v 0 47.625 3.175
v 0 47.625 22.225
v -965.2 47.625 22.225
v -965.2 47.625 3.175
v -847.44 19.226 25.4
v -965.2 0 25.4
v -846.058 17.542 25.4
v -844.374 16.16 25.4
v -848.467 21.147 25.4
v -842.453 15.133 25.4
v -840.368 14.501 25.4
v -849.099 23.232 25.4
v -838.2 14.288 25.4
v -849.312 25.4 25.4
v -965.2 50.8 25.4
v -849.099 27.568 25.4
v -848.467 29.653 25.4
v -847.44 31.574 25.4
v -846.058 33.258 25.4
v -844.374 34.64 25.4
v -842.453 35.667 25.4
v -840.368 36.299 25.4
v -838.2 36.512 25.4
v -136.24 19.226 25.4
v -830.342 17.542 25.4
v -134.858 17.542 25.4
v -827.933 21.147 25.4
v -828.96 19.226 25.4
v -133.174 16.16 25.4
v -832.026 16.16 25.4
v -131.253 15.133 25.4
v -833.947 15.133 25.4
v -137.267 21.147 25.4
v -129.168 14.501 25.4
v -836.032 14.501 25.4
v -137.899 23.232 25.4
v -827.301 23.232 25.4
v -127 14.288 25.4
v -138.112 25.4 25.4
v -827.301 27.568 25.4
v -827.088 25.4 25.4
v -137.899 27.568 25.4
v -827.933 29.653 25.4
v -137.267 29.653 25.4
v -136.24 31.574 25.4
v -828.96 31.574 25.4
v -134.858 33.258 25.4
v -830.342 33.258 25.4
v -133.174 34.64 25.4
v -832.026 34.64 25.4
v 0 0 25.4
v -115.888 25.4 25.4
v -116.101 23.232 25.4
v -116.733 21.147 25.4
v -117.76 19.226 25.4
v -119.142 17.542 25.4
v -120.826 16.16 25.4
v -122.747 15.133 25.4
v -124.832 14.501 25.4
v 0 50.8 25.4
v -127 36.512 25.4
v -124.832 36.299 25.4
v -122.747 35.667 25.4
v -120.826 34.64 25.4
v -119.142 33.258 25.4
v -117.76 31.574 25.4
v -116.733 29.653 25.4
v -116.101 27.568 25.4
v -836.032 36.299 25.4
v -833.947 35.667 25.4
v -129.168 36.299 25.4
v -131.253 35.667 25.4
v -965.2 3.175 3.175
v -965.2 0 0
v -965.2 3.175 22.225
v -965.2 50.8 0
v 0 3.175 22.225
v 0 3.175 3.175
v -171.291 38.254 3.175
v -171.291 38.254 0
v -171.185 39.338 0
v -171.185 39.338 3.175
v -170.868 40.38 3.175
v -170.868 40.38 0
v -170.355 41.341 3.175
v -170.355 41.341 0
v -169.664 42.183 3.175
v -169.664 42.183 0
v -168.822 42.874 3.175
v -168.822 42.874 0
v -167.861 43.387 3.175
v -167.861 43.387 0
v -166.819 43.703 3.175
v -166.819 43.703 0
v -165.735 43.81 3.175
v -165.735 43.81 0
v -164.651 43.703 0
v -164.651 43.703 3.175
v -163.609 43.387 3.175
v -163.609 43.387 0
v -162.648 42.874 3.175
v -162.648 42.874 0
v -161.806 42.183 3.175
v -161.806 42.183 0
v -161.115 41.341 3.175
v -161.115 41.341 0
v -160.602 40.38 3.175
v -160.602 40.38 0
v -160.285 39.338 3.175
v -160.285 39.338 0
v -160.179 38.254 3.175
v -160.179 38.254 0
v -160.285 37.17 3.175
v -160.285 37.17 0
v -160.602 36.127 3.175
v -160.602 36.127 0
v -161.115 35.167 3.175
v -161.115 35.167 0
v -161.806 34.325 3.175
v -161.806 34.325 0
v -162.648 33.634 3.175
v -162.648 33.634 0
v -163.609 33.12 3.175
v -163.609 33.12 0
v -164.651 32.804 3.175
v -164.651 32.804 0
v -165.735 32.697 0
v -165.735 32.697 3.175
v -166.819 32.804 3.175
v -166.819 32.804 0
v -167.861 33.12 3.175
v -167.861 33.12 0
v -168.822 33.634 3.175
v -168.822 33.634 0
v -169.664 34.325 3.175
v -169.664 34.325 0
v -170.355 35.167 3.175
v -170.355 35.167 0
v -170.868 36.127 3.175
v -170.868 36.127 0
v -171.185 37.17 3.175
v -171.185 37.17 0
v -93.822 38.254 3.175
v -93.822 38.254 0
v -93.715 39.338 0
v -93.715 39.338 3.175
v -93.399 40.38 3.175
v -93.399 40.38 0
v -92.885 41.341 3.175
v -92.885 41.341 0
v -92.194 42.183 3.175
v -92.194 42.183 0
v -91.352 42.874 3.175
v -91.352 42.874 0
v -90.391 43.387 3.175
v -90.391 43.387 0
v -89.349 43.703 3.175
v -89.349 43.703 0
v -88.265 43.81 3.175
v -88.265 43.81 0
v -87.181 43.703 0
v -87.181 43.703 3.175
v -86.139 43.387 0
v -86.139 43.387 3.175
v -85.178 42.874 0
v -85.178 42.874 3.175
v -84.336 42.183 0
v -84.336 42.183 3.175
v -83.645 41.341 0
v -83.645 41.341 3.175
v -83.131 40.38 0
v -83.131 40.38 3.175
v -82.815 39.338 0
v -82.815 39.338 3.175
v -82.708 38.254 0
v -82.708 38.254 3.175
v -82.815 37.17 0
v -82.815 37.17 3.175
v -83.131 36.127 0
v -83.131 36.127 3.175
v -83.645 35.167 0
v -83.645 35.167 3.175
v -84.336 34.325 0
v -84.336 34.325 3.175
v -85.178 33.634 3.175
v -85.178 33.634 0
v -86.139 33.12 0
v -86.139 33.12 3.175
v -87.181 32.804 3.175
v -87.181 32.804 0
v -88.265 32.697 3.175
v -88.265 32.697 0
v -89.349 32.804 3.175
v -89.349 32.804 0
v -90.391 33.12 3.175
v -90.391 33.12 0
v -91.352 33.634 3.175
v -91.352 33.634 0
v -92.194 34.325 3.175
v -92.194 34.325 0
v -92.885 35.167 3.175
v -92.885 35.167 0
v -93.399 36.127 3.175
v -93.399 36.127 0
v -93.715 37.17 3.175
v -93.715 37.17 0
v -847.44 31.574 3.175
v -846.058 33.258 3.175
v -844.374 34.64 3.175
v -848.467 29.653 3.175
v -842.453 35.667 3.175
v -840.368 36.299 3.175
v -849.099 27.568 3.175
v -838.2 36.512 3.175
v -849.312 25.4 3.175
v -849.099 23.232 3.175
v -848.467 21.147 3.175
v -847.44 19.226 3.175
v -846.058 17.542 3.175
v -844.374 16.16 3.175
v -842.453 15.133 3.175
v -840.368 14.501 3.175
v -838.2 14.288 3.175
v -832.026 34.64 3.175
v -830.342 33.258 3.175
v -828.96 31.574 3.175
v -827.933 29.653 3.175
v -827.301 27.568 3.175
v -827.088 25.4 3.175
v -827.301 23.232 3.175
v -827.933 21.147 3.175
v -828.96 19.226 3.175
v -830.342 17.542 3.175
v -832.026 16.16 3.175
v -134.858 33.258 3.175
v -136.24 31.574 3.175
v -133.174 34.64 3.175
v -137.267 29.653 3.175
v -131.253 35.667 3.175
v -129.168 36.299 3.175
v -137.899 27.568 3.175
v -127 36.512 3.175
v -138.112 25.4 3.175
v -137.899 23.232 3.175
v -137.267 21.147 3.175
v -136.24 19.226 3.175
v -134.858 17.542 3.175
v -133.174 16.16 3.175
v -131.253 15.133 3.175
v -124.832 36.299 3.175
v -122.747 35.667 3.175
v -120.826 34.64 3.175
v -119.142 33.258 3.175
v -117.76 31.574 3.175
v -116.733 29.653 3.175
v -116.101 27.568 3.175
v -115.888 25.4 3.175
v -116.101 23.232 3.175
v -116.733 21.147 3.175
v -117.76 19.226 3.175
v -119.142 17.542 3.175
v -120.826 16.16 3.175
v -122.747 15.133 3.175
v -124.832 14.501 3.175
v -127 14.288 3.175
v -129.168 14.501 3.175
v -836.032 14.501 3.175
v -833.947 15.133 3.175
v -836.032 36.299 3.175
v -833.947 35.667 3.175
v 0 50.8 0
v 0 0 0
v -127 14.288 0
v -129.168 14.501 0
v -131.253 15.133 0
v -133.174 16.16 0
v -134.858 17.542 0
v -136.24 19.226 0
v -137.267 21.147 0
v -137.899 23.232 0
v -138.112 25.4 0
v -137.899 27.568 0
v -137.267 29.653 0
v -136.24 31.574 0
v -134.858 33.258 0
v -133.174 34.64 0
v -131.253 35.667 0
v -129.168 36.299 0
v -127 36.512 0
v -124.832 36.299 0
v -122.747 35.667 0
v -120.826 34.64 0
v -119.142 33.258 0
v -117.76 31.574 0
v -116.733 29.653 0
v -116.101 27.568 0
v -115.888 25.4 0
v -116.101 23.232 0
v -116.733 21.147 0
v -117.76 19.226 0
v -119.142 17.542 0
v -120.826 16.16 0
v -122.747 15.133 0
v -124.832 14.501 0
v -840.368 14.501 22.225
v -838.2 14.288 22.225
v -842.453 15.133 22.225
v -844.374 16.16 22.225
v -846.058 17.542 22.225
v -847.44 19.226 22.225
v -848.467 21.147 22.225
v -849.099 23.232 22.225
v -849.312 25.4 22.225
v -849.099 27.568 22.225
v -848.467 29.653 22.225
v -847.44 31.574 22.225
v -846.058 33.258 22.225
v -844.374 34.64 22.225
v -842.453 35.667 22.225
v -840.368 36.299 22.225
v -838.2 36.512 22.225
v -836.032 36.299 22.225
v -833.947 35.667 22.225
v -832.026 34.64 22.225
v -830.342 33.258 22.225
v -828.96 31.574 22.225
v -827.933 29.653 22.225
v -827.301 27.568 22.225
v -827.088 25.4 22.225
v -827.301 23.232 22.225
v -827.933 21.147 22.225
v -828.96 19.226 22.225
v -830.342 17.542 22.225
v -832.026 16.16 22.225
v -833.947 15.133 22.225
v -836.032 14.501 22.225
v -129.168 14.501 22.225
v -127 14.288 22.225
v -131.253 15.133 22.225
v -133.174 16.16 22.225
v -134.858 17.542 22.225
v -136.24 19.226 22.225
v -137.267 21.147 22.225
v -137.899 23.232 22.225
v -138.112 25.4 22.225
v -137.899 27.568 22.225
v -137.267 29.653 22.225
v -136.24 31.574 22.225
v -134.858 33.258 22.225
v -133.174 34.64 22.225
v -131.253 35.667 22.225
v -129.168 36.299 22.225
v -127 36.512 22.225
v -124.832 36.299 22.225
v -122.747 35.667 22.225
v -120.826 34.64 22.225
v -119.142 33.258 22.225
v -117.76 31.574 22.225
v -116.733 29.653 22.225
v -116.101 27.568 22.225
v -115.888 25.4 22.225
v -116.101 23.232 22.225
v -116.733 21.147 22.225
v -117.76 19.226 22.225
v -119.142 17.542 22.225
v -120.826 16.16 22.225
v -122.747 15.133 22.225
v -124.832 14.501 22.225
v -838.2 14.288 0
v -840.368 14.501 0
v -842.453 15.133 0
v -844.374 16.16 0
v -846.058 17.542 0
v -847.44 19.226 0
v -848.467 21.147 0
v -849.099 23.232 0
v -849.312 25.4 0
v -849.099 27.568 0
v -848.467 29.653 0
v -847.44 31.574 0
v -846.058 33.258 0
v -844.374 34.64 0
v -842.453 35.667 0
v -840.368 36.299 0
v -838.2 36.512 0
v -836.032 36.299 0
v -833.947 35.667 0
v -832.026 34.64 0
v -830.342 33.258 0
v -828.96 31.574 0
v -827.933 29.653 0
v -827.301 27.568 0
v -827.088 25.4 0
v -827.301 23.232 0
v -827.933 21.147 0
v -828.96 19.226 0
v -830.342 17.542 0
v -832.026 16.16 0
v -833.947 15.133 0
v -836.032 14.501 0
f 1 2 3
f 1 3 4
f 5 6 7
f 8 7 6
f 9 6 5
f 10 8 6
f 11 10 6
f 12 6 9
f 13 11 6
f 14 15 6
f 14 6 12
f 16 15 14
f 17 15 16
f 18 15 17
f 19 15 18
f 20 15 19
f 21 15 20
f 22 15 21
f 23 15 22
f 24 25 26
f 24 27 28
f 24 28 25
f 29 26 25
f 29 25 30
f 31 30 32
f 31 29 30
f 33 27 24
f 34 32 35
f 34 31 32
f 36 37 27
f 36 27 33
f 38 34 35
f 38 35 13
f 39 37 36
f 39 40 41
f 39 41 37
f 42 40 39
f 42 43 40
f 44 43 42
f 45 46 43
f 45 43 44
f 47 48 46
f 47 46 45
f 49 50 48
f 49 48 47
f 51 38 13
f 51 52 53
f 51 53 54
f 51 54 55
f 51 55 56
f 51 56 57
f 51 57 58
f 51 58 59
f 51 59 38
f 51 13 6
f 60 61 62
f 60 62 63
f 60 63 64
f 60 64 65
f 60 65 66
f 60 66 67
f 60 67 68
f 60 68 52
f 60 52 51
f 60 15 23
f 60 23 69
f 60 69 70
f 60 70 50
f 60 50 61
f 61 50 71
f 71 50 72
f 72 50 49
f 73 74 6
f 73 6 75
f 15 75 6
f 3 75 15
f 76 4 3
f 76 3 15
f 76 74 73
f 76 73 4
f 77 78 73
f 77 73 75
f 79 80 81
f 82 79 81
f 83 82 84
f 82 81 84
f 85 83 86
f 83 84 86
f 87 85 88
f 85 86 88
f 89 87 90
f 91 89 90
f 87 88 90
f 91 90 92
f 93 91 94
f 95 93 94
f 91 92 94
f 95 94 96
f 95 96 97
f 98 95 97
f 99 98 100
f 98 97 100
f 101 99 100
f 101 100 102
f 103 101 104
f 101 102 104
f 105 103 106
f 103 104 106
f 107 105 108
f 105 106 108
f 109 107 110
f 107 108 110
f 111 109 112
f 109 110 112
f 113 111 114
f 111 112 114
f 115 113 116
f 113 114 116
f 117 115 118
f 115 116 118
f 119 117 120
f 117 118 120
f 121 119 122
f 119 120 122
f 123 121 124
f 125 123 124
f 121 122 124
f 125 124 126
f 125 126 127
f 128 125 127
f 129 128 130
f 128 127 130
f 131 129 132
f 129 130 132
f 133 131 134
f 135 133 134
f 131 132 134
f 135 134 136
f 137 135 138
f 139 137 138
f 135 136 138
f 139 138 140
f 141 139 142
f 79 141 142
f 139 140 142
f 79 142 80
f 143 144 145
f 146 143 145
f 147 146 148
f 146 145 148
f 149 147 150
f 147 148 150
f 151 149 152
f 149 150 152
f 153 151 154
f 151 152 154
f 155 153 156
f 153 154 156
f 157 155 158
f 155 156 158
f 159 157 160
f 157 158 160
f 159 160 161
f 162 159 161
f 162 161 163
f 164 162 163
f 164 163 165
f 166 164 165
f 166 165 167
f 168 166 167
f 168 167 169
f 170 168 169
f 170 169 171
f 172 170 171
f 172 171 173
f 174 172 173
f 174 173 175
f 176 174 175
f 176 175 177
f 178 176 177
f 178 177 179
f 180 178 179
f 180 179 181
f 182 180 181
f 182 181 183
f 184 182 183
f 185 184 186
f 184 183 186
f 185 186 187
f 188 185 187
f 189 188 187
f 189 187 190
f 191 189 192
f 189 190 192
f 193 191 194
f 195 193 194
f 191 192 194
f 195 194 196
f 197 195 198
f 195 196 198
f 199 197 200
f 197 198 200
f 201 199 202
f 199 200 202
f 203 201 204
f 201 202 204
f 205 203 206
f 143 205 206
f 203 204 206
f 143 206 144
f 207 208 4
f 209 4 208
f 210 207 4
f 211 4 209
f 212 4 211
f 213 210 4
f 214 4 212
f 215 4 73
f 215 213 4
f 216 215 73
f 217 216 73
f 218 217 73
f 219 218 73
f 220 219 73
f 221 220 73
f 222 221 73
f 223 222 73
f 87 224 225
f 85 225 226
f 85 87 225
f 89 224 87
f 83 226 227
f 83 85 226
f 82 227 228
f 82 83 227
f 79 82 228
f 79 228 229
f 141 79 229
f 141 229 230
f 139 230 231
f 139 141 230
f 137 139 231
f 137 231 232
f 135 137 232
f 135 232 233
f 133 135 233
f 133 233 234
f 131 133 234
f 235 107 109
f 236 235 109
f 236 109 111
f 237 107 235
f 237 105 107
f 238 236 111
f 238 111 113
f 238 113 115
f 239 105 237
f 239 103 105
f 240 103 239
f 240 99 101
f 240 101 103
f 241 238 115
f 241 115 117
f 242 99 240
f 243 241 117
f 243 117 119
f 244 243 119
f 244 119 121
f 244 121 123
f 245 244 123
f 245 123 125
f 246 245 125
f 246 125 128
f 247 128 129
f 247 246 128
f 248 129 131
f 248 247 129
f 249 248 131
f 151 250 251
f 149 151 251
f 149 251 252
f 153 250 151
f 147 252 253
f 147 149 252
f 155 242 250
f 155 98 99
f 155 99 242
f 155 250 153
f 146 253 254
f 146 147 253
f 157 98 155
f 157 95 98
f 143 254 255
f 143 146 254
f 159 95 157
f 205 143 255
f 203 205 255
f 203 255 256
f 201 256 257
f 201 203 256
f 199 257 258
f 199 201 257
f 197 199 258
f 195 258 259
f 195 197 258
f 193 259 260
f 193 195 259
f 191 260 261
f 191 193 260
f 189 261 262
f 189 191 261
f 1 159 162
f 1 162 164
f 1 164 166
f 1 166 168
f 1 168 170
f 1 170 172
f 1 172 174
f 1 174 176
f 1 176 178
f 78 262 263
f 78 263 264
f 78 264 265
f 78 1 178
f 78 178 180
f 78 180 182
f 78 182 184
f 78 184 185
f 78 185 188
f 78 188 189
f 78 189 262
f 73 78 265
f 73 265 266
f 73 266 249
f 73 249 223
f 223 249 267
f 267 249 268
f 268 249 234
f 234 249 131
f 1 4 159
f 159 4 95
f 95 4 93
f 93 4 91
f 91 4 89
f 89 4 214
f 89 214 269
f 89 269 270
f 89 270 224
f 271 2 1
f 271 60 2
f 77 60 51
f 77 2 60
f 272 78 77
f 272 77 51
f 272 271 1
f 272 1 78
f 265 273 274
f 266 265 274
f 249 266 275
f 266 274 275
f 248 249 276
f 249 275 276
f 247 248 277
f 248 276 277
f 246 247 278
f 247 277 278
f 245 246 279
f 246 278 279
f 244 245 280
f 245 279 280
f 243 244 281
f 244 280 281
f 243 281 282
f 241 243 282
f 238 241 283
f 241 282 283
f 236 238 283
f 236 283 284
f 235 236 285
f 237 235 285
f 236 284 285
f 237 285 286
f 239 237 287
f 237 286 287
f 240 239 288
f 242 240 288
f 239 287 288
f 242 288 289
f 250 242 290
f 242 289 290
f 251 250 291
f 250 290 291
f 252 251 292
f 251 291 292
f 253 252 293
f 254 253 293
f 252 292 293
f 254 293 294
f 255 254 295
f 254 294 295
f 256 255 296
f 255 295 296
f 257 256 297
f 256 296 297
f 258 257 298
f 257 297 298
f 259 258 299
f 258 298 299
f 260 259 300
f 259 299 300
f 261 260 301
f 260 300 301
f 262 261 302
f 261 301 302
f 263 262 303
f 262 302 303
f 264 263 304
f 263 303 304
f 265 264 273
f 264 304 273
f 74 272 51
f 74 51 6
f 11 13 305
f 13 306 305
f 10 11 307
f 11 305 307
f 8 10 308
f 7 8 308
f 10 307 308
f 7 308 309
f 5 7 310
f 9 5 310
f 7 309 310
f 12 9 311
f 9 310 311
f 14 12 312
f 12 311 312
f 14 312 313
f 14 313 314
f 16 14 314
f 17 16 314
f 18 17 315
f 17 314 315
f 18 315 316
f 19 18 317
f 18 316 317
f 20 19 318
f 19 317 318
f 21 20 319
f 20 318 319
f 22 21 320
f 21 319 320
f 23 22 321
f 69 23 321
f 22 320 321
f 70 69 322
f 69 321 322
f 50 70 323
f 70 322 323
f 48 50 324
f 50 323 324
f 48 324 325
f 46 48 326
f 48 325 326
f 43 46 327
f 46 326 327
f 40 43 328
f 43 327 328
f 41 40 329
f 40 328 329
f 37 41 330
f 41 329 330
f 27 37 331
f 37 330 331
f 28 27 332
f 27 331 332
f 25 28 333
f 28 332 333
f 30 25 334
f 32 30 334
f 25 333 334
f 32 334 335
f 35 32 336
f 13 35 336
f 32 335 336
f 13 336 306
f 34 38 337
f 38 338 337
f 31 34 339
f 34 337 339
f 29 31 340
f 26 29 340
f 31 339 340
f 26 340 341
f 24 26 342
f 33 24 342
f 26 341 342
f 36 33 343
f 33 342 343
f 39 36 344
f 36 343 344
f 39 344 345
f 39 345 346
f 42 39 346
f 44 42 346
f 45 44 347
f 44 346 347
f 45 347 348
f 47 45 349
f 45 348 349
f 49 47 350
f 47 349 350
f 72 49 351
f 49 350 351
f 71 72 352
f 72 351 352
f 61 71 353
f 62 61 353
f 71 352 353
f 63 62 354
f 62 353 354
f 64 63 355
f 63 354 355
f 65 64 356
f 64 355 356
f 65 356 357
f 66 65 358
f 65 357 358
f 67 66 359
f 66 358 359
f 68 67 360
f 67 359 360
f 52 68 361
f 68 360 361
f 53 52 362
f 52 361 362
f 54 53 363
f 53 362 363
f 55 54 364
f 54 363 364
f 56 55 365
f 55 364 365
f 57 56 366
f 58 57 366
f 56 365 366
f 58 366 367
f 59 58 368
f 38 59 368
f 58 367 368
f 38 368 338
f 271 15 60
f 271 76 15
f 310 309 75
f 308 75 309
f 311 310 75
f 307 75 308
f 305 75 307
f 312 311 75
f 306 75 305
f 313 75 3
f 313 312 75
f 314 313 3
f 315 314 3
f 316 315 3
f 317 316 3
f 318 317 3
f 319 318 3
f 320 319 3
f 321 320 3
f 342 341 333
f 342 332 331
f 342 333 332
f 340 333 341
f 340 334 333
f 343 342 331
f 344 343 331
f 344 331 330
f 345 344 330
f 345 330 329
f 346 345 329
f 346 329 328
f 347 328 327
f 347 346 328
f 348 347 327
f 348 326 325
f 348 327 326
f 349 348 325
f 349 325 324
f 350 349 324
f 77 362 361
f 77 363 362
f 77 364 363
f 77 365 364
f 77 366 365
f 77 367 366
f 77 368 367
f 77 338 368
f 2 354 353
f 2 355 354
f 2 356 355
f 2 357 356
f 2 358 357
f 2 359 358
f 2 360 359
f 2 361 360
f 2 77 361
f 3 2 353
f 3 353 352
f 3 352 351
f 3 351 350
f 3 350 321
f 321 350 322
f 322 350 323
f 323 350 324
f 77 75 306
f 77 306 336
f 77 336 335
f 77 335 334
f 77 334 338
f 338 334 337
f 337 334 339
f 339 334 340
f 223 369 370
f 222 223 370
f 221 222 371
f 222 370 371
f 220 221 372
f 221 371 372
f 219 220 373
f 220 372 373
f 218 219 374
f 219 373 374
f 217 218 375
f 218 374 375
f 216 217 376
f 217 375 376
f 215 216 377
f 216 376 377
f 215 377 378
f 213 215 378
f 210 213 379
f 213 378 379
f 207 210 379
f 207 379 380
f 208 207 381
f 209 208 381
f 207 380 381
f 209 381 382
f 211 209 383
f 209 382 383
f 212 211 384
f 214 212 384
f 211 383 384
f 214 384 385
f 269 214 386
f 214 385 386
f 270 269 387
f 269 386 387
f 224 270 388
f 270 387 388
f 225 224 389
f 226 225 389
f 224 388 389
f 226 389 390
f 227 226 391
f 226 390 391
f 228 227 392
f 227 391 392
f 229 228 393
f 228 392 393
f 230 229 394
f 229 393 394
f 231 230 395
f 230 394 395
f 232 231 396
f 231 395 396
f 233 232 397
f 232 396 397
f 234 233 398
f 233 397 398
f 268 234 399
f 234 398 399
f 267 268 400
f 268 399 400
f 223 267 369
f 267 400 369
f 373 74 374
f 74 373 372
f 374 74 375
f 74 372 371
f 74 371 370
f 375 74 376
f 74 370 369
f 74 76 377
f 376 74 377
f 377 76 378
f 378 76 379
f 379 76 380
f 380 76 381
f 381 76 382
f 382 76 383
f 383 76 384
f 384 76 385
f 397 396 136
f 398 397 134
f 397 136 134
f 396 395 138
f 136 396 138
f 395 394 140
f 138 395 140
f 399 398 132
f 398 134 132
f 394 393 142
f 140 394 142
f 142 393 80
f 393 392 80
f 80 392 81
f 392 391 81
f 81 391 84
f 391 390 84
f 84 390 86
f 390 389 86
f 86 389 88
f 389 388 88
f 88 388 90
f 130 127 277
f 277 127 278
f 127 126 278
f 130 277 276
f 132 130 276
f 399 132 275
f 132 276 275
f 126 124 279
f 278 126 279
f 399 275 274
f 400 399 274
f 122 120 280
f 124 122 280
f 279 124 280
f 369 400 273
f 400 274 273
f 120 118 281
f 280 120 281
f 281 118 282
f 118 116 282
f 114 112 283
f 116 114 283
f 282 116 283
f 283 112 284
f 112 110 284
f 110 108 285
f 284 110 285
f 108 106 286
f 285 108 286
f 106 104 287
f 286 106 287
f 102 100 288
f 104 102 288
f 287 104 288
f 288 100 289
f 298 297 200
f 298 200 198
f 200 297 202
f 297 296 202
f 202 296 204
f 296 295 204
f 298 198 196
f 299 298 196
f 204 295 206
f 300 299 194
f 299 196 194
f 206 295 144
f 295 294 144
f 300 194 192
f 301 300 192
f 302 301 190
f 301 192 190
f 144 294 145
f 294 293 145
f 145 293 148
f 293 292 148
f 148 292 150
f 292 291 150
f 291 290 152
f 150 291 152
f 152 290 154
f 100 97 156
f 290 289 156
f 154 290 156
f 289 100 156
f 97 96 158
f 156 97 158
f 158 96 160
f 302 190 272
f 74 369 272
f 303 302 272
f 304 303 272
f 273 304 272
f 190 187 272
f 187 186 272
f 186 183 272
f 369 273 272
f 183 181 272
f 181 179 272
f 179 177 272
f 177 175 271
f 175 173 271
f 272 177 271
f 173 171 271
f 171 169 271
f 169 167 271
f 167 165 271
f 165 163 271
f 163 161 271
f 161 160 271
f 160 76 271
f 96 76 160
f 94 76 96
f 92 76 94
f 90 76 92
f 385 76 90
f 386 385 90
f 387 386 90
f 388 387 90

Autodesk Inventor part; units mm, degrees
ref_plane "YZ Plane" through (0, 0, 0) normal (1, 0, 0) x (0, 1, 0)
ref_plane "XZ Plane" through (0, 0, 0) normal (0, 1, 0) x (-1, 0, 0)
ref_plane "XY Plane" through (0, 0, 0) normal (0, 0, 1) x (1, 0, 0)
sketch "Sketch1" plane through (0, 0, 0) normal (0, 0, 1) x (1, 0, 0)
  line L0 (0, 0) -> (-965.2, 0)
  line L1 (-965.2, 0) -> (-965.2, 50.8)
  line L2 (-965.2, 50.8) -> (0, 50.8)
  line L3 (0, 50.8) -> (0, 0)
  dimension "d0" = 50.8
  dimension "d1" = 965.2
extrude "Extrusion1" add sketch "Sketch1" along normal blind 25.4
sketch "Sketch2" plane through (0, 0, 0) normal (1, 0, 0) x (0, 0, -1)
  line L0 (-3.175, 3.175) -> (-22.225, 3.175)
  line L1 (-22.225, 3.175) -> (-22.225, 47.625)
  line L2 (-22.225, 47.625) -> (-3.175, 47.625)
  line L3 (-3.175, 47.625) -> (-3.175, 3.175)
  line L4 (0, 0) -> (-25.4, 0) projected
  line L5 (0, 50.8) -> (0, 0) projected
  line L6 (0, 50.8) -> (-25.4, 50.8) projected
  line L7 (-25.4, 0) -> (-25.4, 50.8) projected
  dimension "d5" = 3.175
  dimension "d7" = 3.175
  dimension "d8" = 3.175
  dimension "d9" = 3.175
extrude "Extrusion2" cut sketch "Sketch2" against normal blind 965.2 contours L0 L1 L2 L3
sketch "Sketch3" plane through (0, 0, 25.4) normal (0, 0, 1) x (1, 0, 0)
  circle A0 centre (-838.2, 25.4) radius 6.2992
  line L0 (-965.2, 0) -> (0, 0)
  line L1 (-965.2, 0) -> (0, 0) projected
  line L2 (-965.2, 50.8) -> (-965.2, 0) projected
  line L3 (0, 0) -> (0, 50.8) projected
  circle A1 centre (-127, 25.4) radius 11.1125
  dimension "d13" = 25.4
  dimension "d14" = 12.5984
  dimension "d16" = 127
  dimension "d18" = 22.225
hole "Hole1" at (-838.2, 25.4, 25.4) at (-127, 25.4, 25.4) direction (0, 0, -1) diameter 22.225 end through all
sketch "Sketch4" plane through (0, 0, 0) normal (0, 0, -1) x (-1, 0, 0)
  circle A0 centre (165.735, 38.2537) radius 5.5563 projected
  arc A1 (85.416, 33.4832) -> (85.0155, 42.761) centre (88.5446, 38.2658) ccw projected
  circle A2 centre (165.735, 38.2537) radius 5.5563
  circle A3 centre (88.265, 38.2537) radius 5.5565
  circle A4 centre (88.265, 38.2537) radius 5.5565 projected
  point P0 (0, 0)
extrude "Extrusion3" cut sketch "Sketch4" against normal blind 5.08 contours A0 | A3
